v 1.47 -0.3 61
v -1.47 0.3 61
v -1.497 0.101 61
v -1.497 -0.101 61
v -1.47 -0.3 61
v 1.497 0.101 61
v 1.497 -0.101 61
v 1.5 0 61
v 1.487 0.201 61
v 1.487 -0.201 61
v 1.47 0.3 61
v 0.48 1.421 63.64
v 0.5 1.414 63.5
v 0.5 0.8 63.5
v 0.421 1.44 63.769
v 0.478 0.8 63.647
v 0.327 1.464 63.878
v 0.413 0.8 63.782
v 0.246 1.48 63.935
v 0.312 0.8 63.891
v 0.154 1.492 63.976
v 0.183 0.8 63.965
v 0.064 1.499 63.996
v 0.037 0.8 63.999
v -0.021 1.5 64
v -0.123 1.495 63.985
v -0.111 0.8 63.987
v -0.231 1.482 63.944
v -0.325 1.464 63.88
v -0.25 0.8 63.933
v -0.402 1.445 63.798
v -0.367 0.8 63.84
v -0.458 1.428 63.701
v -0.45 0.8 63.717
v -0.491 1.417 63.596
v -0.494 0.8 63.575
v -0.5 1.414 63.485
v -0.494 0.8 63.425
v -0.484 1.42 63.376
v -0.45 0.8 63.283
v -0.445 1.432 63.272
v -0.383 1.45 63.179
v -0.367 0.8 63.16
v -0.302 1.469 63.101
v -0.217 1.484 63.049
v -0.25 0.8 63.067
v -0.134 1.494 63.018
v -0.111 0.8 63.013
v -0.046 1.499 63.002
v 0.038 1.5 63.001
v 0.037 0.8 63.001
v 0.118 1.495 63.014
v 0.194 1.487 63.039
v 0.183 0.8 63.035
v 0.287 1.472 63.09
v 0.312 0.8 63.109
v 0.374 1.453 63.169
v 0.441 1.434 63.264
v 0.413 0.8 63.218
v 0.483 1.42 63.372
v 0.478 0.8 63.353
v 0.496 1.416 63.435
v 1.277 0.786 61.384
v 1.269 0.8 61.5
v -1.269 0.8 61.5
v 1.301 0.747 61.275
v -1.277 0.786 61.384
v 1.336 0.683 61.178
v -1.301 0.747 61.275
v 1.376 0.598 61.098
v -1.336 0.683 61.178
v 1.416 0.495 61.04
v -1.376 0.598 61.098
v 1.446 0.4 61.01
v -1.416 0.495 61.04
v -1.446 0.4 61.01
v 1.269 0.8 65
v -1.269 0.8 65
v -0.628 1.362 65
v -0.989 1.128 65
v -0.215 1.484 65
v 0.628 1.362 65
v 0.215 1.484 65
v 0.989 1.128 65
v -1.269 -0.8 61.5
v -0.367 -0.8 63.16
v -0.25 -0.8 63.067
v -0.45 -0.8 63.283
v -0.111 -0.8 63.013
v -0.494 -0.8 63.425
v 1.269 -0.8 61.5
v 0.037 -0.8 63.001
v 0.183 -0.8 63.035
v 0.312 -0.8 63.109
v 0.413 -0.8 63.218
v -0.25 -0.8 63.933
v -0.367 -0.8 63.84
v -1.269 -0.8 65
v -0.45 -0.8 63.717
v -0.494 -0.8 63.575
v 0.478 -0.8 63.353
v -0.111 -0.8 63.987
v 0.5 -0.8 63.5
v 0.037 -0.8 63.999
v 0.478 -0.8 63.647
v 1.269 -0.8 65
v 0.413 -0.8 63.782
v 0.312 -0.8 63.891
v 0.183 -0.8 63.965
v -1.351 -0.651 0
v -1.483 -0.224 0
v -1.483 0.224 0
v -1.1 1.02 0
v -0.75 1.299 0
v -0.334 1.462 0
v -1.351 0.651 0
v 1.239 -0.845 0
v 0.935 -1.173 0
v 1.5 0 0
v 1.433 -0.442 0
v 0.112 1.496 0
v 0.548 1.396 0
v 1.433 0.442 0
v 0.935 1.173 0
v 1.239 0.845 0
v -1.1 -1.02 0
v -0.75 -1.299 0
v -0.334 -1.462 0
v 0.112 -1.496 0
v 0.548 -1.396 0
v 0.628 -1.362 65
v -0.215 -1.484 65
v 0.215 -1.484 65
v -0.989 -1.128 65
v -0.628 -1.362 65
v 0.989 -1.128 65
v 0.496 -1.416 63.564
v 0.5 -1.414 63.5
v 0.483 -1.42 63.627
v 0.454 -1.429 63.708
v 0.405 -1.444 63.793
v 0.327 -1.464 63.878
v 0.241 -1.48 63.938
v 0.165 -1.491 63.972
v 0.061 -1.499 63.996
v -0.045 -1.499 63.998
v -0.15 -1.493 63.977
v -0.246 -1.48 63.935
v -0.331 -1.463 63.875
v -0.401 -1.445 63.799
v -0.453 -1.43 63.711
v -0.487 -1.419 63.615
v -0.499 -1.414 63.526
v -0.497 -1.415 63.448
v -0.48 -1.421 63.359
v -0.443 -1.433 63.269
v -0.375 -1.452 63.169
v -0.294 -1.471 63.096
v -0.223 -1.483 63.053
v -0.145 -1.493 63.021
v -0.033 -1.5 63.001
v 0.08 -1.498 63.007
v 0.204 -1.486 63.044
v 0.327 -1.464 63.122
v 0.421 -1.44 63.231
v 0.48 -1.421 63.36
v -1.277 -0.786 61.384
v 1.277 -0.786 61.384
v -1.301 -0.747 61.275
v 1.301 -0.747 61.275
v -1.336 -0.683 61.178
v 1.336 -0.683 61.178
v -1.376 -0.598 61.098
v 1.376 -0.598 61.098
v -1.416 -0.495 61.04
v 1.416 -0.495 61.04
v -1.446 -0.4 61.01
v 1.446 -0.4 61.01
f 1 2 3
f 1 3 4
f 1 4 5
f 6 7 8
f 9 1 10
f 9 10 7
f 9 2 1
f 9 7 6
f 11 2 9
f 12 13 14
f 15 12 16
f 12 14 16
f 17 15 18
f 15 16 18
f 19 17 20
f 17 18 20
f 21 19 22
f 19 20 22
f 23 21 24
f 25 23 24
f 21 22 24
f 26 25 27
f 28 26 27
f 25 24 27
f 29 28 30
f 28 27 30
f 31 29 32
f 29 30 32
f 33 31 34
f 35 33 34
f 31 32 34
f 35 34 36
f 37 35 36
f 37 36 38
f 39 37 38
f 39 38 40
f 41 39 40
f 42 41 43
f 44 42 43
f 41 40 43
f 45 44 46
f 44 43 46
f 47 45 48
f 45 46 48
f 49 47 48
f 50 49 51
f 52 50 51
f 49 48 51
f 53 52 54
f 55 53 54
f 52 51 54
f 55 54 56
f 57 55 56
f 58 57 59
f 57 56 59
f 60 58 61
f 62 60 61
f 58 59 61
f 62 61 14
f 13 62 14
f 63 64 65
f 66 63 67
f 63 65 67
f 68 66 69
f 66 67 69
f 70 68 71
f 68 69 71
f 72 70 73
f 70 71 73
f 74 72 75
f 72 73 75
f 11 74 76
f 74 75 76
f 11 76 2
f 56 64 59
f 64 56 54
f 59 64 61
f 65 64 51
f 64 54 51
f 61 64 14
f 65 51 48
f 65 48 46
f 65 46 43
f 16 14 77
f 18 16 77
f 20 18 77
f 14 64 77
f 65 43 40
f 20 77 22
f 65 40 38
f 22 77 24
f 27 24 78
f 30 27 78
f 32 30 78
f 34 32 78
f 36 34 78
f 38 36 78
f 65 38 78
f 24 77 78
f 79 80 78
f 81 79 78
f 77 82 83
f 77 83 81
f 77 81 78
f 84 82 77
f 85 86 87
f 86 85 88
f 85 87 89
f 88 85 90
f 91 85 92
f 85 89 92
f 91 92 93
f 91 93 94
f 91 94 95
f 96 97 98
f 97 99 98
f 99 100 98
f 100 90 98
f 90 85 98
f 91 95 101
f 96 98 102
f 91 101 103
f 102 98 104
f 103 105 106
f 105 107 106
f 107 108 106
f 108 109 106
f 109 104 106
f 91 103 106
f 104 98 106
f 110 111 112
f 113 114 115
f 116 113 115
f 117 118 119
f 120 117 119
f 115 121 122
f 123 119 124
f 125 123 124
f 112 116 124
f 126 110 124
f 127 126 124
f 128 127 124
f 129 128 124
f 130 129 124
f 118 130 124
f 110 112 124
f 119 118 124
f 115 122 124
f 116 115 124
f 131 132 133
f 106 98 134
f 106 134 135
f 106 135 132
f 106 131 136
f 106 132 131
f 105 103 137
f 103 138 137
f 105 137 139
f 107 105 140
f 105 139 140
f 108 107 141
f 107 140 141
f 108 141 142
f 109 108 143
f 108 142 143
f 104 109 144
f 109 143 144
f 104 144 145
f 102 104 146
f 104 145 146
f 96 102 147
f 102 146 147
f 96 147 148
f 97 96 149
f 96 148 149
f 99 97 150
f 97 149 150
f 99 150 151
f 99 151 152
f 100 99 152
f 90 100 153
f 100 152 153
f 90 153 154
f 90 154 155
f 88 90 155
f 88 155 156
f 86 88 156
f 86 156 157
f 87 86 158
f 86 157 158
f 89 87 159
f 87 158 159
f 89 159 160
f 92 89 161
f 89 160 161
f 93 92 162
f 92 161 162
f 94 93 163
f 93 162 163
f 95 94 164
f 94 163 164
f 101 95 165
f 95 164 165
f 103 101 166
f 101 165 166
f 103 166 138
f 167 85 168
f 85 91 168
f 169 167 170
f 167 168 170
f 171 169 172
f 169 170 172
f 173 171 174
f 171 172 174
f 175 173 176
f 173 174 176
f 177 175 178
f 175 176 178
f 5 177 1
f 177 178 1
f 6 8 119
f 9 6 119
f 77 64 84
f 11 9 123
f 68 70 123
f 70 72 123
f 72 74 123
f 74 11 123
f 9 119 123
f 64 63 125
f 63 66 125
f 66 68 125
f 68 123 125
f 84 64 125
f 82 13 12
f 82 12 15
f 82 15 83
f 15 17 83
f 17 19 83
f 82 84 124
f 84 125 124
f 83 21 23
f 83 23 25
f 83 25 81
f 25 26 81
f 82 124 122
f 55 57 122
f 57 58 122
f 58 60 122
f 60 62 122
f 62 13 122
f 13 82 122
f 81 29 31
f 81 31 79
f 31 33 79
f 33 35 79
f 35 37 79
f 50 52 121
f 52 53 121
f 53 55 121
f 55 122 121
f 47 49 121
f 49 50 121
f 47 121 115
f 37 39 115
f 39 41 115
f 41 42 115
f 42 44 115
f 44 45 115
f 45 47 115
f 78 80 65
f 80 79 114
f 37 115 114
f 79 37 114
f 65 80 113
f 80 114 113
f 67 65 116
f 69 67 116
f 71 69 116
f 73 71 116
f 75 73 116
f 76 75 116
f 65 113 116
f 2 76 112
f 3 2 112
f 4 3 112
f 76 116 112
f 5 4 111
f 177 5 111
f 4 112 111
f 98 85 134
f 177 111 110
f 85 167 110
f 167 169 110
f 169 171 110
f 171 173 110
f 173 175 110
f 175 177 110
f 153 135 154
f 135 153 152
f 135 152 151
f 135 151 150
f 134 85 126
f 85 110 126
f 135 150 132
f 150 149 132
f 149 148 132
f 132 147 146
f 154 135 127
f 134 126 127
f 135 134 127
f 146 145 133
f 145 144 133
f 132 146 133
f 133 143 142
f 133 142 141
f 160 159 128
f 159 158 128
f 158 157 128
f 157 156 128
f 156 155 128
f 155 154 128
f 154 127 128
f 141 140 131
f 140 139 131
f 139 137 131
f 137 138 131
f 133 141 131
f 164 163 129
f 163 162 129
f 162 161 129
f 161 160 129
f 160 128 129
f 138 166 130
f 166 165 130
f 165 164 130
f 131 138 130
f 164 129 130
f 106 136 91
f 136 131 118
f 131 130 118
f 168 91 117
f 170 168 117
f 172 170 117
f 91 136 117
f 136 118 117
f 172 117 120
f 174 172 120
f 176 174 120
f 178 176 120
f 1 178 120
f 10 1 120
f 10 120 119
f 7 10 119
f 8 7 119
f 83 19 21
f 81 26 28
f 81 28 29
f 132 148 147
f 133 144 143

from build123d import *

# Parameters (mm, degrees)
F0_R     = 1.5
F1_DEPTH = 65
F3_DEPTH = 4
F4_R     = 0.5
F5_DEPTH = 1.5
F6_R     = 0.5


with BuildPart() as f1:
    # F0 (on Top) → F1 (new body)
    with BuildSketch(Plane.XY):
        Circle(F0_R)
    extrude(amount=F1_DEPTH)

    # F2 (on face) → F3 (cut)
    with BuildSketch(Plane.XY.offset(65)):
        with BuildLine():
            Line((1.268857754, 0.8), (-1.268857754, 0.8))
            ThreePointArc((-1.268857754, 0.8), (-1.5, 0), (-1.268857754, -0.8))
            Line((-1.268857754, -0.8), (1.268857754, -0.8))
            ThreePointArc((1.268857754, -0.8), (1.4410563193, -0.4163612428), (1.5, 0))
            ThreePointArc((1.5, 0), (1.4410563193, 0.4163612428), (1.268857754, 0.8))
        make_face()
    extrude(amount=-F3_DEPTH, mode=Mode.SUBTRACT)

    # F4 (on Front) → F5 (cut, symmetric)
    with BuildSketch(Plane.XZ):
        with Locations((0, 63.5)):
            Circle(F4_R)
    extrude(amount=F5_DEPTH, both=True, mode=Mode.SUBTRACT)

    # F6
    f6_edges = [f1.edges().sort_by_distance(p)[0] for p in [
        (0, -0.8, 61),
        (0, 0.8, 61),
    ]]
    fillet(f6_edges, radius=F6_R)


solid = f1.part
